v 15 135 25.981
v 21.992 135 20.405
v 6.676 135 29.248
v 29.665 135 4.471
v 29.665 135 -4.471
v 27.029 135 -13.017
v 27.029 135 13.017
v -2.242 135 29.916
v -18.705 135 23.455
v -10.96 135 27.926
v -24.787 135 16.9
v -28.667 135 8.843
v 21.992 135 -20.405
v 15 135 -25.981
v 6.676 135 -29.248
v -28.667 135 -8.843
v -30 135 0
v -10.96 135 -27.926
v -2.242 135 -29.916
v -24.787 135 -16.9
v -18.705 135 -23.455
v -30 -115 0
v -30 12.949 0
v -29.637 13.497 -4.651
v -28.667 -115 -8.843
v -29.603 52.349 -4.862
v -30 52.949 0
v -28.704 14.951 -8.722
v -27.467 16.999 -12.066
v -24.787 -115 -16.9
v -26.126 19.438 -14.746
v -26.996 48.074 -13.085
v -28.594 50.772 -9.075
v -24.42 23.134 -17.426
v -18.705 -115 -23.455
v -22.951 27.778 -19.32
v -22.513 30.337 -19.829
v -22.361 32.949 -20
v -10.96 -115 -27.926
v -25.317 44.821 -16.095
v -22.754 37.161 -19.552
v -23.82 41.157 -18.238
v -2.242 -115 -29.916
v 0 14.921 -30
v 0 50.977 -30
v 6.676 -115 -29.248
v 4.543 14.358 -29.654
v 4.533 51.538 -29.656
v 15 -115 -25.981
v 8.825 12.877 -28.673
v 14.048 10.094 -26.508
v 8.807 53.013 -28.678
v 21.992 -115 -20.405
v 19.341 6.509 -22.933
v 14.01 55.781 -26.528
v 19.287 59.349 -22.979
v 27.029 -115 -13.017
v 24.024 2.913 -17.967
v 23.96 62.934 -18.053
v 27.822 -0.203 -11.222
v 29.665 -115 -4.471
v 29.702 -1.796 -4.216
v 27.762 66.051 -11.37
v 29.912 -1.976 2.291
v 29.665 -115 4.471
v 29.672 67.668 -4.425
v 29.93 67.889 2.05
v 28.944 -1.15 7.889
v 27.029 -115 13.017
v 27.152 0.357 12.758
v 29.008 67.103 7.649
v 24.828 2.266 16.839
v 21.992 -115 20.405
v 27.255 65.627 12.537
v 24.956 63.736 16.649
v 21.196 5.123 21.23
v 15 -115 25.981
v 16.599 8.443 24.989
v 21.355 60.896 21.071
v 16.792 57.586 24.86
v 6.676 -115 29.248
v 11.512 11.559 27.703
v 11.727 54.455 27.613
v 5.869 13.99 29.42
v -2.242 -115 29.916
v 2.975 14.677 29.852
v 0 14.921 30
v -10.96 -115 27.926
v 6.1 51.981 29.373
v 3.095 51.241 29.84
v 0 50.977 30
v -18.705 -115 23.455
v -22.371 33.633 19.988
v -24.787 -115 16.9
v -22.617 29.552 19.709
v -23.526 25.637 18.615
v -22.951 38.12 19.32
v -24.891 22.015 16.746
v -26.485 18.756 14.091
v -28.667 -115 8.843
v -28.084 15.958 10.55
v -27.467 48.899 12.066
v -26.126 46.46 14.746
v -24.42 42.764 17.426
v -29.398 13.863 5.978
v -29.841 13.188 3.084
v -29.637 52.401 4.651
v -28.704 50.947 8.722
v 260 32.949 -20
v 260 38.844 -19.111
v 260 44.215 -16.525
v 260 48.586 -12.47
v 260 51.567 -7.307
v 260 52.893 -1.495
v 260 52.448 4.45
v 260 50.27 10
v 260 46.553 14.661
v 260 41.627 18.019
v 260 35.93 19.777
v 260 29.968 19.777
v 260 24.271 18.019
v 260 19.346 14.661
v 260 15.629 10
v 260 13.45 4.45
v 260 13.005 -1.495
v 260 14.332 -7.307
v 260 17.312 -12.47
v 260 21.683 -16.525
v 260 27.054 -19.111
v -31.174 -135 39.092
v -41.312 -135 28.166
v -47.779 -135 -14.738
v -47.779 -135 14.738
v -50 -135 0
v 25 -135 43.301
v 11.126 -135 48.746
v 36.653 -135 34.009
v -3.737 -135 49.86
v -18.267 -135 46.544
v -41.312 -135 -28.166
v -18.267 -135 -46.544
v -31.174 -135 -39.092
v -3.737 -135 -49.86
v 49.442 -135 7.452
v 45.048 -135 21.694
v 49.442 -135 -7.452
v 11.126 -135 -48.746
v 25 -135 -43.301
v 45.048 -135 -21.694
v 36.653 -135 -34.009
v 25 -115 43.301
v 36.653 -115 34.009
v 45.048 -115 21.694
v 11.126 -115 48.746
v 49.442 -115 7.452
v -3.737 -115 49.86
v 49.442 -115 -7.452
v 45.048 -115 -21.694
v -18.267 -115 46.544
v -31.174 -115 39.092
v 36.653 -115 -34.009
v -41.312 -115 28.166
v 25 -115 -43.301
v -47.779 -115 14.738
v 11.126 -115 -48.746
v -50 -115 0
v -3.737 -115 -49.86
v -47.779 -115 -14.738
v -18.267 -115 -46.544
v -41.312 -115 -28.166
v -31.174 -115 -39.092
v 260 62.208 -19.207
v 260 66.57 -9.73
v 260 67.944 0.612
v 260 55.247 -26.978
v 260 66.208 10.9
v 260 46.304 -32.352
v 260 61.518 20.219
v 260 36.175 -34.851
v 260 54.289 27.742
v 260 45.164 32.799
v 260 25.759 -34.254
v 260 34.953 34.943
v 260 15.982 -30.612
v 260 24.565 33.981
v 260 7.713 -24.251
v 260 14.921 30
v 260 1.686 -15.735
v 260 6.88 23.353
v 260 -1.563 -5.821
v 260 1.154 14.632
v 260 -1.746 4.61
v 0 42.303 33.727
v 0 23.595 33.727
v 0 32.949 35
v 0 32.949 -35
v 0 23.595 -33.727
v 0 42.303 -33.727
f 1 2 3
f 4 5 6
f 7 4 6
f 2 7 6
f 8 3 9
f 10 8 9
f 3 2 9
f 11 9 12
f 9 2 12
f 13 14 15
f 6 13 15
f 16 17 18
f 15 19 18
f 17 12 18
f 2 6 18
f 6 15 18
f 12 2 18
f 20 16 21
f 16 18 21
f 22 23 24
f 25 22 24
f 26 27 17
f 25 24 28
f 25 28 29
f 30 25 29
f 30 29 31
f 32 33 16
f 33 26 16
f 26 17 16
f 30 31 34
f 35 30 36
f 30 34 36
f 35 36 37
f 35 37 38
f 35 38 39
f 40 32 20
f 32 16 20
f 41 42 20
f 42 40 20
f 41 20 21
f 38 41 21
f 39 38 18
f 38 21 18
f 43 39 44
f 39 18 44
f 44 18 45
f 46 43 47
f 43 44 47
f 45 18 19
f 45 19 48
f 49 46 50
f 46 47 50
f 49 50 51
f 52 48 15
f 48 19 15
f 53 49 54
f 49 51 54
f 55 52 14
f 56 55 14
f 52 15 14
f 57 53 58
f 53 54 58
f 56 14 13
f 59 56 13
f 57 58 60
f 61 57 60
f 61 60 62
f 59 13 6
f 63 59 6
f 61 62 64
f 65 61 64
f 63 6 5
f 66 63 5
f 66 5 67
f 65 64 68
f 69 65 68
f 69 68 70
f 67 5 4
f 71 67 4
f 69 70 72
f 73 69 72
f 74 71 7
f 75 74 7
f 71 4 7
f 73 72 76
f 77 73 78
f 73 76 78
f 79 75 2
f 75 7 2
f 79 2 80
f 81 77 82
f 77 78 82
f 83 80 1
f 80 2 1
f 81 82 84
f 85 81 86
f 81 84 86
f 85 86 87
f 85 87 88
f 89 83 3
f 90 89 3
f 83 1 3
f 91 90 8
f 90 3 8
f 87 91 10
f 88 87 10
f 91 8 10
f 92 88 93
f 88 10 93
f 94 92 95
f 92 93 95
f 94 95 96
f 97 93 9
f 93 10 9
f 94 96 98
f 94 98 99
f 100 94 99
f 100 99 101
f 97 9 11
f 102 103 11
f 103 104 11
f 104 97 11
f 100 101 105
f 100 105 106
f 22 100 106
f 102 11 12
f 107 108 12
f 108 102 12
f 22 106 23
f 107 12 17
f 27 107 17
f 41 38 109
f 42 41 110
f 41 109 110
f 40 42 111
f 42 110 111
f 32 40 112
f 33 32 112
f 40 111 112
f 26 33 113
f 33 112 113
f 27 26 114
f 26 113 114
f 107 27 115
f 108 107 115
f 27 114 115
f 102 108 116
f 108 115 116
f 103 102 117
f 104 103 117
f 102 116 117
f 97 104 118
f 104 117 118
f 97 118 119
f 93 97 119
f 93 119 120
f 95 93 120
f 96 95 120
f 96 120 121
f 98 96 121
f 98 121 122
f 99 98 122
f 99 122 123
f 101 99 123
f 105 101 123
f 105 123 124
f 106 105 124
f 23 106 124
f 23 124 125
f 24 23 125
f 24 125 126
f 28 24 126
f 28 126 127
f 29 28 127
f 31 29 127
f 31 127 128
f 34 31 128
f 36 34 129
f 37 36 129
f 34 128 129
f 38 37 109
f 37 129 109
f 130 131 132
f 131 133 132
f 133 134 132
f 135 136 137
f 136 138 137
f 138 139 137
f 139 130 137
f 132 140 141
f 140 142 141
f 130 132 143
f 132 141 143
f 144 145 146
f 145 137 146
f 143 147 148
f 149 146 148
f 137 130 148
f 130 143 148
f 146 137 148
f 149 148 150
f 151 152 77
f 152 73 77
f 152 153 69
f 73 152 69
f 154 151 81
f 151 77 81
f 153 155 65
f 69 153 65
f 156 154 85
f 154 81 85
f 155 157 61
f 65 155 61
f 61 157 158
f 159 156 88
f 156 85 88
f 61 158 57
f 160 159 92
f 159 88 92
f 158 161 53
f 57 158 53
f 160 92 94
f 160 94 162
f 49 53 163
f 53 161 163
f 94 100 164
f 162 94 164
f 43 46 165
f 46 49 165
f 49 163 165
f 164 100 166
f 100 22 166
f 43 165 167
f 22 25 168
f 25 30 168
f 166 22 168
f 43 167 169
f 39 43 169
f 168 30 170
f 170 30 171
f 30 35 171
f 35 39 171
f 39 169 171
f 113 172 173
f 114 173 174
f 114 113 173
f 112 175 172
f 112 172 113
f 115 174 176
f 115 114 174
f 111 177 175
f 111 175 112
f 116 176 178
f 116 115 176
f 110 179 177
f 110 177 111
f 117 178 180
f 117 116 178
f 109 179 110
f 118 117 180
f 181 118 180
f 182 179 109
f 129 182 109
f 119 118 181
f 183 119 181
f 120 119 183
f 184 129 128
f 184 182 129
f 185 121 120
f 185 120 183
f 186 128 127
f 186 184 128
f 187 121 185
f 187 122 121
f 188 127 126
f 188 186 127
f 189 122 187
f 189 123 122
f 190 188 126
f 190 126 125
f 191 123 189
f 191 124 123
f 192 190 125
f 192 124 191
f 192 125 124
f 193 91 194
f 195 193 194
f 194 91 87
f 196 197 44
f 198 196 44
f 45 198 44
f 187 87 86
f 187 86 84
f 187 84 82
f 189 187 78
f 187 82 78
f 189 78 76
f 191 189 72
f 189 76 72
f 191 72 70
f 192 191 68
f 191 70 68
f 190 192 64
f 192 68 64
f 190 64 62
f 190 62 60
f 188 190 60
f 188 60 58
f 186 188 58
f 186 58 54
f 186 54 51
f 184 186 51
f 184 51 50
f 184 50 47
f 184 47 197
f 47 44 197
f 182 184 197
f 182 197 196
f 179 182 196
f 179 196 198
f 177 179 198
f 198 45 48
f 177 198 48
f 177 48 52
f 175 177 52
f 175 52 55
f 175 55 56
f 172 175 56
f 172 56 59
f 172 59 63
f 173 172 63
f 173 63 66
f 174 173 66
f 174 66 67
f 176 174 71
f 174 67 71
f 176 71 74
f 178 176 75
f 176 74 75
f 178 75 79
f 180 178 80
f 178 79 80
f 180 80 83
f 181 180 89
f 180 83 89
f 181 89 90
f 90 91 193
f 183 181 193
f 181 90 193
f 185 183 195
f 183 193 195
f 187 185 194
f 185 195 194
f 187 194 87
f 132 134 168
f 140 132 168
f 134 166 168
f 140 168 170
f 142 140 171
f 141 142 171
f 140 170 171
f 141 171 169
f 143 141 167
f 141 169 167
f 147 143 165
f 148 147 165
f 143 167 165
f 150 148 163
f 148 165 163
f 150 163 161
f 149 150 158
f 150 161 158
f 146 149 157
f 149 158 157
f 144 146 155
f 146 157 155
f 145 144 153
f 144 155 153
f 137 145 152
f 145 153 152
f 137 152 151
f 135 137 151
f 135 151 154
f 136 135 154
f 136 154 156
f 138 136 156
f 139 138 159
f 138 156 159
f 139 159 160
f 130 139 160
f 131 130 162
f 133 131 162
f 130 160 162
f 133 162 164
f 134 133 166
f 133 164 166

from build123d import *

# Parameters (mm, degrees)
SKETCH2_R           = 35
BOSS_EXTRUDE1_DEPTH = 260
SKETCH3_R           = 20
CUT_EXTRUDE1_DEPTH  = 342.796723254


with BuildPart() as part:
    # Sketch1 → Revolve1 (revolve)
    with BuildSketch(Plane.XY):
        Polygon((0, 135), (0, -135), (50, -135), (50, -115), (30, -115), (30, 135), align=None)
    revolve(axis=Axis((0, 135, 0), (0, -1, 0)))

    # Sketch2 → Boss-Extrude1 (add)
    with BuildSketch(Plane(origin=(0, 0, 0), x_dir=(0, 0, 1), z_dir=(1, 0, 0))):
        with Locations((0, -32.949046657)):
            Circle(SKETCH2_R)
    extrude(amount=BOSS_EXTRUDE1_DEPTH)

    # Sketch3 → Cut-Extrude1 (cut, through all)
    with BuildSketch(Plane(origin=(260, 0, 0), x_dir=(0, 0, -1), z_dir=(1, 0, 0))):
        with Locations((0, 32.949046657)):
            Circle(SKETCH3_R)
    extrude(amount=-CUT_EXTRUDE1_DEPTH, mode=Mode.SUBTRACT)


solid = part.part
